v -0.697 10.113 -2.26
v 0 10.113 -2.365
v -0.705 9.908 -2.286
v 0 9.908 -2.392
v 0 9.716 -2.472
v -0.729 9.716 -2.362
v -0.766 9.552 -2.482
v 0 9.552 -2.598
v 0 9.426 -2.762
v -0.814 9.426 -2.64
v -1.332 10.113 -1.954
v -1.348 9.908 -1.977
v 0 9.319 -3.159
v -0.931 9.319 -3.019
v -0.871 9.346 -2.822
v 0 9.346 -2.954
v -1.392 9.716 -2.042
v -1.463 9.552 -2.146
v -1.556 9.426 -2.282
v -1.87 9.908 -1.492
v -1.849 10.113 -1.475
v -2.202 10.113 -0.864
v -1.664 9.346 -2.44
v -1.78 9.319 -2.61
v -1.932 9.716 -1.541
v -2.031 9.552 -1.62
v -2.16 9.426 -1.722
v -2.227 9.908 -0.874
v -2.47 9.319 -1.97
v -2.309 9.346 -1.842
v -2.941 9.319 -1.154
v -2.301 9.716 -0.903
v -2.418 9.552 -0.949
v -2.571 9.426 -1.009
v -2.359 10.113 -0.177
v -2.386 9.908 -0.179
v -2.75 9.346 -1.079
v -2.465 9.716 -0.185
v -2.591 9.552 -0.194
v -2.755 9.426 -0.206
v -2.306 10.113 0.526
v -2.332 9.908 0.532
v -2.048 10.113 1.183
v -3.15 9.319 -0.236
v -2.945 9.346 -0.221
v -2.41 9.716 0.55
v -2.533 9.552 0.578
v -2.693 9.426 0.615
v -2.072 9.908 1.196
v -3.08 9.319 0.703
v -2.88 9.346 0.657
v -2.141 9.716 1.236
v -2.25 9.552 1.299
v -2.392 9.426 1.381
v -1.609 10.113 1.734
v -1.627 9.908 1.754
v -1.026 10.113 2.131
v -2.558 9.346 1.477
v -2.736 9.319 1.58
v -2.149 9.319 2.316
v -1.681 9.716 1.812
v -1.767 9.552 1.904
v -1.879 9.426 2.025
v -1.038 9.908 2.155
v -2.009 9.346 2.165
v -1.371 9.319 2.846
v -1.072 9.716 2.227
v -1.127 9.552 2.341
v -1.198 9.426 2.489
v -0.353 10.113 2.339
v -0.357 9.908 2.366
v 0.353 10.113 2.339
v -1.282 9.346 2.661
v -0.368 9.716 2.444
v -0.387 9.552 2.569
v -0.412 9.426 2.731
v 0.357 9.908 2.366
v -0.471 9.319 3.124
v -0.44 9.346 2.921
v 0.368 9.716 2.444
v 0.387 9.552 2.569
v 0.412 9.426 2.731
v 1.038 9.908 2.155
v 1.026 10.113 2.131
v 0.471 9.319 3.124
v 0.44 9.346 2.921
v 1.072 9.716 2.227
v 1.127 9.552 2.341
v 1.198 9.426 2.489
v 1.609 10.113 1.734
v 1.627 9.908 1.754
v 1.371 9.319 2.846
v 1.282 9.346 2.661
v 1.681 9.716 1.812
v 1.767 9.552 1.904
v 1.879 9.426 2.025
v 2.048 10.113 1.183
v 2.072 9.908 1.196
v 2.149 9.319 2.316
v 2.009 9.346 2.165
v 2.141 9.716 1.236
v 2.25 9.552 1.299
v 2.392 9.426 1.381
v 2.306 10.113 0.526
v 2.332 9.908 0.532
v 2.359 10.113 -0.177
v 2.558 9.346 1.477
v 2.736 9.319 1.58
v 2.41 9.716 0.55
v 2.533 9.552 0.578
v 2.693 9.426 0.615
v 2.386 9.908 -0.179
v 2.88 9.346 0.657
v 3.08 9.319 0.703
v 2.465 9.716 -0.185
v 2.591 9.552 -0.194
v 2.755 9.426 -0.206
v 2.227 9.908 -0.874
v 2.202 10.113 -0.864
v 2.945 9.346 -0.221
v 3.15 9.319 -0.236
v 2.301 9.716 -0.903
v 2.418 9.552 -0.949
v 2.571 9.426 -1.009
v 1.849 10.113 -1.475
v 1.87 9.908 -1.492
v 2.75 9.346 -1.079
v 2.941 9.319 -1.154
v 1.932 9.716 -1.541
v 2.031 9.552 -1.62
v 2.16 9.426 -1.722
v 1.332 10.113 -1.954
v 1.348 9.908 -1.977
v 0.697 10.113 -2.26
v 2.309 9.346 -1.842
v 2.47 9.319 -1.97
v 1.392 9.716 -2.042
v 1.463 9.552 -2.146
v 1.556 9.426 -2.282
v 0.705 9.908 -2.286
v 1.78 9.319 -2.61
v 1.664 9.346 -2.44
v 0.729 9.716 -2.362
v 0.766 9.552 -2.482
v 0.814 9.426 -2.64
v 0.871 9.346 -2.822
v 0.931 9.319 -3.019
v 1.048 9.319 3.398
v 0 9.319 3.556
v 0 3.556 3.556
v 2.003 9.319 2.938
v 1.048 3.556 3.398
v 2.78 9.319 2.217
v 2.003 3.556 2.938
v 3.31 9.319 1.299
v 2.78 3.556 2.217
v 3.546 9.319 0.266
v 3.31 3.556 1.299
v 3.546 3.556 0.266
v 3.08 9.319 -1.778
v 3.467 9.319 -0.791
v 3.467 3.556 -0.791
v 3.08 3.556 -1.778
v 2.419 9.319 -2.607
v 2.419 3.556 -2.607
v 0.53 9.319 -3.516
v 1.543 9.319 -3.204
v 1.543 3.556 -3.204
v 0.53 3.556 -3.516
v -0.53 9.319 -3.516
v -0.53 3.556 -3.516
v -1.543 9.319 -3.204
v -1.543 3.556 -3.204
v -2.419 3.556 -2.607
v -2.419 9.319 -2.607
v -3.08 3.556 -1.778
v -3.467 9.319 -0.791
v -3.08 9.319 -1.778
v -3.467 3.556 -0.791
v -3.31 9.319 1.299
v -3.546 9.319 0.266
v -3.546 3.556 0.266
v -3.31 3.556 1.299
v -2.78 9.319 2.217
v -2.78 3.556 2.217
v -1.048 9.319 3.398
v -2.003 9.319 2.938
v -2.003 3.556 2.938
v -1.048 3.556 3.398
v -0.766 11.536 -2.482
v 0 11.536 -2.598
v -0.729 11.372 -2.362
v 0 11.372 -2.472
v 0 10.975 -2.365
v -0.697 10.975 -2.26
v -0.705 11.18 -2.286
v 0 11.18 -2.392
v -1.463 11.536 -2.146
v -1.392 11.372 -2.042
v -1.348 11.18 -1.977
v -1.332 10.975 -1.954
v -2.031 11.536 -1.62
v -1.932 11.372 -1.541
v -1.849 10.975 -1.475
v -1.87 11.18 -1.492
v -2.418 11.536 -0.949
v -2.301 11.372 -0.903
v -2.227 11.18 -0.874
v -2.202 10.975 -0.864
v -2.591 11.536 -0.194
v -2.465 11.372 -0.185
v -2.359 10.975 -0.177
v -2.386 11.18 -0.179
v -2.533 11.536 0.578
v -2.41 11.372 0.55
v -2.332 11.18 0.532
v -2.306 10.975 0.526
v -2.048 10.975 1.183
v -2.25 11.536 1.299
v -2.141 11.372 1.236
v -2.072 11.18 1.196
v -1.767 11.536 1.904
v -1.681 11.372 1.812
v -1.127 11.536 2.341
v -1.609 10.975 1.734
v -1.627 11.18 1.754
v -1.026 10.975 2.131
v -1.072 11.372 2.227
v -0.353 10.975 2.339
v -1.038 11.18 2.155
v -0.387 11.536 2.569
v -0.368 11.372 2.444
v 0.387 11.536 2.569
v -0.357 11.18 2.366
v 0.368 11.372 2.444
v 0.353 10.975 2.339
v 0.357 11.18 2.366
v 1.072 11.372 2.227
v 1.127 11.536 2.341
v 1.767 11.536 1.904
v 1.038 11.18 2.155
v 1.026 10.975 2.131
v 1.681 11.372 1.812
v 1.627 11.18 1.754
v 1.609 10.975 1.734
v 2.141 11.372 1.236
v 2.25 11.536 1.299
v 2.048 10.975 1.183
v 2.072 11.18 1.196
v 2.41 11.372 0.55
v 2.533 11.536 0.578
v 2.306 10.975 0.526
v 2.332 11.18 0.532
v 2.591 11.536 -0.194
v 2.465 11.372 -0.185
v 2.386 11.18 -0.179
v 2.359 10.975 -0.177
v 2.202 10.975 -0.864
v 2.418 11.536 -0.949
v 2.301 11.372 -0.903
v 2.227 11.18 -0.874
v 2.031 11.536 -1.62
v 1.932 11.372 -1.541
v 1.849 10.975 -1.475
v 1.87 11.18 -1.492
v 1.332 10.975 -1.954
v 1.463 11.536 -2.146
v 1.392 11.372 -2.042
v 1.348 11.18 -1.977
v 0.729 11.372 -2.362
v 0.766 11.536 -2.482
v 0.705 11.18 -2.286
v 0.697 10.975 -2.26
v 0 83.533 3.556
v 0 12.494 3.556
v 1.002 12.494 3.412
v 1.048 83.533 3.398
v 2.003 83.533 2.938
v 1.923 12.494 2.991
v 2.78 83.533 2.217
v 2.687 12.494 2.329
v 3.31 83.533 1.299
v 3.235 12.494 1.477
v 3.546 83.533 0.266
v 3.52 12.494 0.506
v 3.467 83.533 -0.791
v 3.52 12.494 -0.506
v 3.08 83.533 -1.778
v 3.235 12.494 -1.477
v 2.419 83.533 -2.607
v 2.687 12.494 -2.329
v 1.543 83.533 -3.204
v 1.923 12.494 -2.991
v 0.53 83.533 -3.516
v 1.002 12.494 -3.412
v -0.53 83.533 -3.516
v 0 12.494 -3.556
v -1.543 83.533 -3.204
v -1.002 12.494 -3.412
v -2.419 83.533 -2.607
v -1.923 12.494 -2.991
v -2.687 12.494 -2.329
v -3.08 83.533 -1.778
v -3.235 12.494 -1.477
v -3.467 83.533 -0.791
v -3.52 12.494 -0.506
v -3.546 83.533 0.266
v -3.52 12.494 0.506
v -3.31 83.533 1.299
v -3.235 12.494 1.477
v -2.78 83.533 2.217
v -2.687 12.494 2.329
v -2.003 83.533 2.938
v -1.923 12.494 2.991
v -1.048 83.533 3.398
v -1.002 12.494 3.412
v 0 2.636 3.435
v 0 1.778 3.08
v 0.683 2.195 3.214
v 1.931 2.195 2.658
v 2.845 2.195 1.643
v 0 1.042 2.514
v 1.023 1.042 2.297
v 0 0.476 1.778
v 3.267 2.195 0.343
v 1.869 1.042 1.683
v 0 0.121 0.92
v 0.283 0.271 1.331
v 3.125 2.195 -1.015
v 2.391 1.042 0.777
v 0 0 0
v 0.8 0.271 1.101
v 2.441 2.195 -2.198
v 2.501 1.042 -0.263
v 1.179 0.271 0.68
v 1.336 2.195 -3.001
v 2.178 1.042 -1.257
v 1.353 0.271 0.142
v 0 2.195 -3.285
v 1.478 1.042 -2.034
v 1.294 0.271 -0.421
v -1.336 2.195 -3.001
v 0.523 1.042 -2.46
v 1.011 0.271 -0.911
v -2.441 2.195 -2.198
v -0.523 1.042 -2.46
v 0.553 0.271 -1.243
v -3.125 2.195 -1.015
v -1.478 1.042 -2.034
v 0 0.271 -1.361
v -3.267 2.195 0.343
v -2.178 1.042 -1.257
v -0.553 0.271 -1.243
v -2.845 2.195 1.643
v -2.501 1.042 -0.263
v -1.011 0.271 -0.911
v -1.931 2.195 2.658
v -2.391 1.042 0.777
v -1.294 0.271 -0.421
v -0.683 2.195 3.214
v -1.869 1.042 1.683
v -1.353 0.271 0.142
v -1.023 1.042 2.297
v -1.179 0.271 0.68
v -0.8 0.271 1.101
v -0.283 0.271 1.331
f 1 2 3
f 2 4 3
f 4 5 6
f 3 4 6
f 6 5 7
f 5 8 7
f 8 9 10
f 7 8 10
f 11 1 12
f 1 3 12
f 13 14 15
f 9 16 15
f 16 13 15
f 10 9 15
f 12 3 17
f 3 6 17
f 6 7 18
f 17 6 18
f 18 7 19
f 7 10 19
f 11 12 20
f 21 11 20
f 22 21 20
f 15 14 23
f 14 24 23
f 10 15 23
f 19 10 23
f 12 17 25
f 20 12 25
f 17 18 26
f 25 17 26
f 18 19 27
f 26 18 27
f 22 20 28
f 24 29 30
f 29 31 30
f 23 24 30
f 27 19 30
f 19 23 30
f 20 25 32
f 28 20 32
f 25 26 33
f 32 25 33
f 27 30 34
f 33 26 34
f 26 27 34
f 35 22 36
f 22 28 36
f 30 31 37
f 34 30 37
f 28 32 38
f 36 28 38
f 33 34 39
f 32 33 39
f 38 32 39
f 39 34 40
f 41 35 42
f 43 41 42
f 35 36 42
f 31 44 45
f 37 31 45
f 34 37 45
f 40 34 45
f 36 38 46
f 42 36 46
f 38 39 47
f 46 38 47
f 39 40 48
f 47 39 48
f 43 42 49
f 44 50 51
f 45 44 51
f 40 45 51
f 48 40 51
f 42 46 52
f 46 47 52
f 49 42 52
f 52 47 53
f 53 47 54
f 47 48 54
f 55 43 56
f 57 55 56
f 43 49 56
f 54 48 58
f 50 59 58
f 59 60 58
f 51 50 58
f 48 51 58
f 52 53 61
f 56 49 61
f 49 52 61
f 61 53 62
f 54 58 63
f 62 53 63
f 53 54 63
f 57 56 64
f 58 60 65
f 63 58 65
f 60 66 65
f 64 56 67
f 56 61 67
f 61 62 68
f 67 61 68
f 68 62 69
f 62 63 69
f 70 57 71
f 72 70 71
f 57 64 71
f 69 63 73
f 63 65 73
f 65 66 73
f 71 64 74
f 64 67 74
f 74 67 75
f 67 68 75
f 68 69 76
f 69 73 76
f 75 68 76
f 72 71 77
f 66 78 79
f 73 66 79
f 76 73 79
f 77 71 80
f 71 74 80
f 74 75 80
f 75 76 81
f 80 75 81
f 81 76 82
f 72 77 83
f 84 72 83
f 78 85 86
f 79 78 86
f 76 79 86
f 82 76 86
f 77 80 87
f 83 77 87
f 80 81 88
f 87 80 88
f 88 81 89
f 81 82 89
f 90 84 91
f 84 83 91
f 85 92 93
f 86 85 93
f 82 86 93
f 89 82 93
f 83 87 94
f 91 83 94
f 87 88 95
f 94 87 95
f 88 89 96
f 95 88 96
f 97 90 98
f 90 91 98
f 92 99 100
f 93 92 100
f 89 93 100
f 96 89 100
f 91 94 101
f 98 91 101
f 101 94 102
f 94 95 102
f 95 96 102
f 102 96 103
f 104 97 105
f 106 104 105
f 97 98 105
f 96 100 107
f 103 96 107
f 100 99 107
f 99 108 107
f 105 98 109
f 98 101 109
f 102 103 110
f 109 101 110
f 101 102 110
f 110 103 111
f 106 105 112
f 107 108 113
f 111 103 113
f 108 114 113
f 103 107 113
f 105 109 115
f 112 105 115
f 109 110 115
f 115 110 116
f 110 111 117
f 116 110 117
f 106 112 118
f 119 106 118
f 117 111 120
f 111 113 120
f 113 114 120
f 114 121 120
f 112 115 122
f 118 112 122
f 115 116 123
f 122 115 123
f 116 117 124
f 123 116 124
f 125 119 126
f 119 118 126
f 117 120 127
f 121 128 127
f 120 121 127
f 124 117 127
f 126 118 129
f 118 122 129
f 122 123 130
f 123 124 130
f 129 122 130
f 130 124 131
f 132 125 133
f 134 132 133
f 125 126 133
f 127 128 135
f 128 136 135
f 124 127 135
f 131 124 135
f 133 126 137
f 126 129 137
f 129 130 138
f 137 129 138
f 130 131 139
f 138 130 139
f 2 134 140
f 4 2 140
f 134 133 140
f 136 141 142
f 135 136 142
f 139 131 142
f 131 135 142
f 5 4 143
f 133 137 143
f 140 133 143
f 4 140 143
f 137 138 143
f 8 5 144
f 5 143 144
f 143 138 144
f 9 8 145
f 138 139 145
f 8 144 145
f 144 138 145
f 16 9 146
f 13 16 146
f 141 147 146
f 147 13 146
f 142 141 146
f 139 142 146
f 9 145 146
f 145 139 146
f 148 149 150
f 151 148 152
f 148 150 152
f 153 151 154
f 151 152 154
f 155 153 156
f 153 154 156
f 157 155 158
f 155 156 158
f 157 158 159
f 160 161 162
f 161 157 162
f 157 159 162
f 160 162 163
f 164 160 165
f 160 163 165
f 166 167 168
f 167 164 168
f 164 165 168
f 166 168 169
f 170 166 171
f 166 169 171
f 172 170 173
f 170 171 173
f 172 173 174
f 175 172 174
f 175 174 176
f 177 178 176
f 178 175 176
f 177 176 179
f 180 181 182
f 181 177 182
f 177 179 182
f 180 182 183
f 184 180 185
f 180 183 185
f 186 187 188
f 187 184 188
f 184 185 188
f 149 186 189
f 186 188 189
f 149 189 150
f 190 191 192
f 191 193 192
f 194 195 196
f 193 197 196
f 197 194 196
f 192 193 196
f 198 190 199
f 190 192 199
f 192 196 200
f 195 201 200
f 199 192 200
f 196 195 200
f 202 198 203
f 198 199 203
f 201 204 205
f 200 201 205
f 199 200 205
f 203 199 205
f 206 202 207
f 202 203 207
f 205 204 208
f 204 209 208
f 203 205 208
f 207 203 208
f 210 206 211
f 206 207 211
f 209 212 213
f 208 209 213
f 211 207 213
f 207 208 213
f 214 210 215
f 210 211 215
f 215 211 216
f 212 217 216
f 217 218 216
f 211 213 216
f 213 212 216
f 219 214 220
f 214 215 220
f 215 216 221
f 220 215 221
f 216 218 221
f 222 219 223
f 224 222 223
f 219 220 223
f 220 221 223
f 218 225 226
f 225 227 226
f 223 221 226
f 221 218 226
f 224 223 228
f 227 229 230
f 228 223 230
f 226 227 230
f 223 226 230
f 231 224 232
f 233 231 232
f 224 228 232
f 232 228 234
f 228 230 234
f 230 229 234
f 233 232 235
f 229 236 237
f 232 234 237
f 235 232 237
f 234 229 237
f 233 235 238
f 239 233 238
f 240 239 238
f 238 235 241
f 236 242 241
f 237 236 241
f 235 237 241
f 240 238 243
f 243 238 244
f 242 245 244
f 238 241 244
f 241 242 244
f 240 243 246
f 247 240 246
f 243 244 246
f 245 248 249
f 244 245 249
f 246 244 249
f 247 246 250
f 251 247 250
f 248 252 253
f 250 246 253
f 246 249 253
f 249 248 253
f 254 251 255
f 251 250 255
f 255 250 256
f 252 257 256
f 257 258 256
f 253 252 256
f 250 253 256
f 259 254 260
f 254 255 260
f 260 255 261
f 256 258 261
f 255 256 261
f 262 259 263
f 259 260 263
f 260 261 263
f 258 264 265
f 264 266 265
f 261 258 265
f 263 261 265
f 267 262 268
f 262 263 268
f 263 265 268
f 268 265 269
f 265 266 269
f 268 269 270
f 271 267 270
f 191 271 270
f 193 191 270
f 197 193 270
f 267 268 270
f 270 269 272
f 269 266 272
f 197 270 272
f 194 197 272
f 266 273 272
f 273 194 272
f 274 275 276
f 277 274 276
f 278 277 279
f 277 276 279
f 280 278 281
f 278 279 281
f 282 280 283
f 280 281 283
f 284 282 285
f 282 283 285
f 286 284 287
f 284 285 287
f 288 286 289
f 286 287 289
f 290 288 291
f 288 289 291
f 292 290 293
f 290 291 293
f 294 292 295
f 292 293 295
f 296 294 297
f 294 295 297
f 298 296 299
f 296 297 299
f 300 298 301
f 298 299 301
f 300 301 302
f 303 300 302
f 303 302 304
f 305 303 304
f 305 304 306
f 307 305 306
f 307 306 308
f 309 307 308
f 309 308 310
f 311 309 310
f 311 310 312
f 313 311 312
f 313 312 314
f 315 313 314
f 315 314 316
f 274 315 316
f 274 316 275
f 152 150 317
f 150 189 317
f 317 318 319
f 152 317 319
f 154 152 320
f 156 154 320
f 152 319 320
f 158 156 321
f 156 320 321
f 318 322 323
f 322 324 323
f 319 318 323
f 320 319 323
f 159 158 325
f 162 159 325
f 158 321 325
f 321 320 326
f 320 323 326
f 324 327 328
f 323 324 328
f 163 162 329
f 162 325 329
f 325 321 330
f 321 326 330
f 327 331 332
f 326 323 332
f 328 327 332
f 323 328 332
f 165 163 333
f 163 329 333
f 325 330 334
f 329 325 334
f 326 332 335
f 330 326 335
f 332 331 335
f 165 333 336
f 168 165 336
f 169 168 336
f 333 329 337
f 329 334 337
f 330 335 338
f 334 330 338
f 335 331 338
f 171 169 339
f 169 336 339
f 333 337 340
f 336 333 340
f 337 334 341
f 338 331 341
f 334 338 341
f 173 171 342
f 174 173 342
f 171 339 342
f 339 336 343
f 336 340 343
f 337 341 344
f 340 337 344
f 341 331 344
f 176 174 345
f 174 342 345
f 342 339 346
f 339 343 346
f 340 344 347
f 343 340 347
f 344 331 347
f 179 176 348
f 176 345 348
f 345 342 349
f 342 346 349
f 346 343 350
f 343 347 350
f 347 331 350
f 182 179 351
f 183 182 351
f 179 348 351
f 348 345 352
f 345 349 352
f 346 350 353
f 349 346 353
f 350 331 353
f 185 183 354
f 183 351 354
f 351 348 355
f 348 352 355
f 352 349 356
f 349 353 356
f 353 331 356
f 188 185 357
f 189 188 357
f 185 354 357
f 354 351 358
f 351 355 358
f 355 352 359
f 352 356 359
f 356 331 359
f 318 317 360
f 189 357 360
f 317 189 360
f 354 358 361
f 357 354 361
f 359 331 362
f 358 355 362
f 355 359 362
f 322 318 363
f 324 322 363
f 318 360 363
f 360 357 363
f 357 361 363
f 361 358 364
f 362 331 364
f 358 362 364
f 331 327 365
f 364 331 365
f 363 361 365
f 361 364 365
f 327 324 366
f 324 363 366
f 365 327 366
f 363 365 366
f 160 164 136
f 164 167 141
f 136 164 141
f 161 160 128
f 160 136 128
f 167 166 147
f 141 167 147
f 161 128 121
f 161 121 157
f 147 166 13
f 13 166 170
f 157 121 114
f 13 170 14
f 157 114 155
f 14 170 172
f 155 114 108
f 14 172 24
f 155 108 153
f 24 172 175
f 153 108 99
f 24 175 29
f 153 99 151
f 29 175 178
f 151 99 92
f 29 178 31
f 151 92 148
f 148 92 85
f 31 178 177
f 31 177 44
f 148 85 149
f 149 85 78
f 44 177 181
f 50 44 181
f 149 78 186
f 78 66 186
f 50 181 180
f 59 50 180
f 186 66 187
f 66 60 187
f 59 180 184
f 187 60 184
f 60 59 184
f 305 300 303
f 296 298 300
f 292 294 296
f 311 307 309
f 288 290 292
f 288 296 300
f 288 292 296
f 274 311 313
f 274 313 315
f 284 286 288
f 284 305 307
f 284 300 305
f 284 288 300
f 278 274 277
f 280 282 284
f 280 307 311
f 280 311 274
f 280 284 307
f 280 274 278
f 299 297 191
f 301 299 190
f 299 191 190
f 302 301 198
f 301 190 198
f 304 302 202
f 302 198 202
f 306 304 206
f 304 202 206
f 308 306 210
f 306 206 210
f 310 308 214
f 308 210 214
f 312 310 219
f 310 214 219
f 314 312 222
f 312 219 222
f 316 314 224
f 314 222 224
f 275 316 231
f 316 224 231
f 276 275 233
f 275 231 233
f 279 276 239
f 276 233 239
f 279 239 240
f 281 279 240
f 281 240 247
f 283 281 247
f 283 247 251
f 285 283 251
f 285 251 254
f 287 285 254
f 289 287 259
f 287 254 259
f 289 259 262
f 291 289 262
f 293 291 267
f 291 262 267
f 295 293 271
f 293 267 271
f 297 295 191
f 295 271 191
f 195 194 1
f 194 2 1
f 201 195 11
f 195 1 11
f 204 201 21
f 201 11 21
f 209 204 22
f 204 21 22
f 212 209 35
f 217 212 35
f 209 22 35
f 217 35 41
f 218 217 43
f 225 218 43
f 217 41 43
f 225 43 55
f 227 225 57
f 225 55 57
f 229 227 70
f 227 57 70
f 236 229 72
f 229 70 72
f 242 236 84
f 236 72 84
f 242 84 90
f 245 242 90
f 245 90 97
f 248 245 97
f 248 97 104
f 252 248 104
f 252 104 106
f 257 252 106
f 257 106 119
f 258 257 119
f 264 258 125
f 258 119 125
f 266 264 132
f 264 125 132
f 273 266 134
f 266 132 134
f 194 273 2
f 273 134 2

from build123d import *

# Parameters (mm, degrees)
SKETCH1_R           = 3.556
BOSS_EXTRUDE1_DEPTH = 83.53298
FILLET1_R           = 3.556


with BuildPart() as part:
    # Sketch1 → Boss-Extrude1 (new body)
    with BuildSketch(Plane(origin=(0, 0, 0), x_dir=(1, 0, 0), z_dir=(0, 1, 0))):
        with Locations(Location((0, 0, 0), (0, 0, 270))):
            Circle(SKETCH1_R)
    extrude(amount=BOSS_EXTRUDE1_DEPTH)

    # Sketch2 → Cut-Revolve2 (revolve, cut)
    with BuildSketch(Plane(origin=(0, 100.014806598, -21.087436426), x_dir=(0, -1, 0), z_dir=(1, 0, 0))):
        with BuildLine():
            Line((90.695546598, -17.531436426), (87.520546598, -17.531436426))
            Line((87.520546598, -17.531436426), (88.478687606, -18.489577434))
            ThreePointArc((88.478687606, -18.489577434), (88.736198639, -18.661640805), (89.039953613, -18.722061426))
            Line((89.039953613, -18.722061426), (89.901796598, -18.722061426))
            ThreePointArc((89.901796598, -18.722061426), (90.463062606, -18.489577434), (90.695546598, -17.928311426))
            Line((90.695546598, -17.928311426), (90.695546598, -17.531436426))
        make_face()
    revolve(axis=Axis((0, 0, 0), (0, 1, 0)), mode=Mode.SUBTRACT)

    # Fillet1
    fillet1_edges = [part.edges().sort_by_distance(p)[0] for p in [
        (0, 0, -3.556),
    ]]
    fillet(fillet1_edges, radius=FILLET1_R)


solid = part.part
